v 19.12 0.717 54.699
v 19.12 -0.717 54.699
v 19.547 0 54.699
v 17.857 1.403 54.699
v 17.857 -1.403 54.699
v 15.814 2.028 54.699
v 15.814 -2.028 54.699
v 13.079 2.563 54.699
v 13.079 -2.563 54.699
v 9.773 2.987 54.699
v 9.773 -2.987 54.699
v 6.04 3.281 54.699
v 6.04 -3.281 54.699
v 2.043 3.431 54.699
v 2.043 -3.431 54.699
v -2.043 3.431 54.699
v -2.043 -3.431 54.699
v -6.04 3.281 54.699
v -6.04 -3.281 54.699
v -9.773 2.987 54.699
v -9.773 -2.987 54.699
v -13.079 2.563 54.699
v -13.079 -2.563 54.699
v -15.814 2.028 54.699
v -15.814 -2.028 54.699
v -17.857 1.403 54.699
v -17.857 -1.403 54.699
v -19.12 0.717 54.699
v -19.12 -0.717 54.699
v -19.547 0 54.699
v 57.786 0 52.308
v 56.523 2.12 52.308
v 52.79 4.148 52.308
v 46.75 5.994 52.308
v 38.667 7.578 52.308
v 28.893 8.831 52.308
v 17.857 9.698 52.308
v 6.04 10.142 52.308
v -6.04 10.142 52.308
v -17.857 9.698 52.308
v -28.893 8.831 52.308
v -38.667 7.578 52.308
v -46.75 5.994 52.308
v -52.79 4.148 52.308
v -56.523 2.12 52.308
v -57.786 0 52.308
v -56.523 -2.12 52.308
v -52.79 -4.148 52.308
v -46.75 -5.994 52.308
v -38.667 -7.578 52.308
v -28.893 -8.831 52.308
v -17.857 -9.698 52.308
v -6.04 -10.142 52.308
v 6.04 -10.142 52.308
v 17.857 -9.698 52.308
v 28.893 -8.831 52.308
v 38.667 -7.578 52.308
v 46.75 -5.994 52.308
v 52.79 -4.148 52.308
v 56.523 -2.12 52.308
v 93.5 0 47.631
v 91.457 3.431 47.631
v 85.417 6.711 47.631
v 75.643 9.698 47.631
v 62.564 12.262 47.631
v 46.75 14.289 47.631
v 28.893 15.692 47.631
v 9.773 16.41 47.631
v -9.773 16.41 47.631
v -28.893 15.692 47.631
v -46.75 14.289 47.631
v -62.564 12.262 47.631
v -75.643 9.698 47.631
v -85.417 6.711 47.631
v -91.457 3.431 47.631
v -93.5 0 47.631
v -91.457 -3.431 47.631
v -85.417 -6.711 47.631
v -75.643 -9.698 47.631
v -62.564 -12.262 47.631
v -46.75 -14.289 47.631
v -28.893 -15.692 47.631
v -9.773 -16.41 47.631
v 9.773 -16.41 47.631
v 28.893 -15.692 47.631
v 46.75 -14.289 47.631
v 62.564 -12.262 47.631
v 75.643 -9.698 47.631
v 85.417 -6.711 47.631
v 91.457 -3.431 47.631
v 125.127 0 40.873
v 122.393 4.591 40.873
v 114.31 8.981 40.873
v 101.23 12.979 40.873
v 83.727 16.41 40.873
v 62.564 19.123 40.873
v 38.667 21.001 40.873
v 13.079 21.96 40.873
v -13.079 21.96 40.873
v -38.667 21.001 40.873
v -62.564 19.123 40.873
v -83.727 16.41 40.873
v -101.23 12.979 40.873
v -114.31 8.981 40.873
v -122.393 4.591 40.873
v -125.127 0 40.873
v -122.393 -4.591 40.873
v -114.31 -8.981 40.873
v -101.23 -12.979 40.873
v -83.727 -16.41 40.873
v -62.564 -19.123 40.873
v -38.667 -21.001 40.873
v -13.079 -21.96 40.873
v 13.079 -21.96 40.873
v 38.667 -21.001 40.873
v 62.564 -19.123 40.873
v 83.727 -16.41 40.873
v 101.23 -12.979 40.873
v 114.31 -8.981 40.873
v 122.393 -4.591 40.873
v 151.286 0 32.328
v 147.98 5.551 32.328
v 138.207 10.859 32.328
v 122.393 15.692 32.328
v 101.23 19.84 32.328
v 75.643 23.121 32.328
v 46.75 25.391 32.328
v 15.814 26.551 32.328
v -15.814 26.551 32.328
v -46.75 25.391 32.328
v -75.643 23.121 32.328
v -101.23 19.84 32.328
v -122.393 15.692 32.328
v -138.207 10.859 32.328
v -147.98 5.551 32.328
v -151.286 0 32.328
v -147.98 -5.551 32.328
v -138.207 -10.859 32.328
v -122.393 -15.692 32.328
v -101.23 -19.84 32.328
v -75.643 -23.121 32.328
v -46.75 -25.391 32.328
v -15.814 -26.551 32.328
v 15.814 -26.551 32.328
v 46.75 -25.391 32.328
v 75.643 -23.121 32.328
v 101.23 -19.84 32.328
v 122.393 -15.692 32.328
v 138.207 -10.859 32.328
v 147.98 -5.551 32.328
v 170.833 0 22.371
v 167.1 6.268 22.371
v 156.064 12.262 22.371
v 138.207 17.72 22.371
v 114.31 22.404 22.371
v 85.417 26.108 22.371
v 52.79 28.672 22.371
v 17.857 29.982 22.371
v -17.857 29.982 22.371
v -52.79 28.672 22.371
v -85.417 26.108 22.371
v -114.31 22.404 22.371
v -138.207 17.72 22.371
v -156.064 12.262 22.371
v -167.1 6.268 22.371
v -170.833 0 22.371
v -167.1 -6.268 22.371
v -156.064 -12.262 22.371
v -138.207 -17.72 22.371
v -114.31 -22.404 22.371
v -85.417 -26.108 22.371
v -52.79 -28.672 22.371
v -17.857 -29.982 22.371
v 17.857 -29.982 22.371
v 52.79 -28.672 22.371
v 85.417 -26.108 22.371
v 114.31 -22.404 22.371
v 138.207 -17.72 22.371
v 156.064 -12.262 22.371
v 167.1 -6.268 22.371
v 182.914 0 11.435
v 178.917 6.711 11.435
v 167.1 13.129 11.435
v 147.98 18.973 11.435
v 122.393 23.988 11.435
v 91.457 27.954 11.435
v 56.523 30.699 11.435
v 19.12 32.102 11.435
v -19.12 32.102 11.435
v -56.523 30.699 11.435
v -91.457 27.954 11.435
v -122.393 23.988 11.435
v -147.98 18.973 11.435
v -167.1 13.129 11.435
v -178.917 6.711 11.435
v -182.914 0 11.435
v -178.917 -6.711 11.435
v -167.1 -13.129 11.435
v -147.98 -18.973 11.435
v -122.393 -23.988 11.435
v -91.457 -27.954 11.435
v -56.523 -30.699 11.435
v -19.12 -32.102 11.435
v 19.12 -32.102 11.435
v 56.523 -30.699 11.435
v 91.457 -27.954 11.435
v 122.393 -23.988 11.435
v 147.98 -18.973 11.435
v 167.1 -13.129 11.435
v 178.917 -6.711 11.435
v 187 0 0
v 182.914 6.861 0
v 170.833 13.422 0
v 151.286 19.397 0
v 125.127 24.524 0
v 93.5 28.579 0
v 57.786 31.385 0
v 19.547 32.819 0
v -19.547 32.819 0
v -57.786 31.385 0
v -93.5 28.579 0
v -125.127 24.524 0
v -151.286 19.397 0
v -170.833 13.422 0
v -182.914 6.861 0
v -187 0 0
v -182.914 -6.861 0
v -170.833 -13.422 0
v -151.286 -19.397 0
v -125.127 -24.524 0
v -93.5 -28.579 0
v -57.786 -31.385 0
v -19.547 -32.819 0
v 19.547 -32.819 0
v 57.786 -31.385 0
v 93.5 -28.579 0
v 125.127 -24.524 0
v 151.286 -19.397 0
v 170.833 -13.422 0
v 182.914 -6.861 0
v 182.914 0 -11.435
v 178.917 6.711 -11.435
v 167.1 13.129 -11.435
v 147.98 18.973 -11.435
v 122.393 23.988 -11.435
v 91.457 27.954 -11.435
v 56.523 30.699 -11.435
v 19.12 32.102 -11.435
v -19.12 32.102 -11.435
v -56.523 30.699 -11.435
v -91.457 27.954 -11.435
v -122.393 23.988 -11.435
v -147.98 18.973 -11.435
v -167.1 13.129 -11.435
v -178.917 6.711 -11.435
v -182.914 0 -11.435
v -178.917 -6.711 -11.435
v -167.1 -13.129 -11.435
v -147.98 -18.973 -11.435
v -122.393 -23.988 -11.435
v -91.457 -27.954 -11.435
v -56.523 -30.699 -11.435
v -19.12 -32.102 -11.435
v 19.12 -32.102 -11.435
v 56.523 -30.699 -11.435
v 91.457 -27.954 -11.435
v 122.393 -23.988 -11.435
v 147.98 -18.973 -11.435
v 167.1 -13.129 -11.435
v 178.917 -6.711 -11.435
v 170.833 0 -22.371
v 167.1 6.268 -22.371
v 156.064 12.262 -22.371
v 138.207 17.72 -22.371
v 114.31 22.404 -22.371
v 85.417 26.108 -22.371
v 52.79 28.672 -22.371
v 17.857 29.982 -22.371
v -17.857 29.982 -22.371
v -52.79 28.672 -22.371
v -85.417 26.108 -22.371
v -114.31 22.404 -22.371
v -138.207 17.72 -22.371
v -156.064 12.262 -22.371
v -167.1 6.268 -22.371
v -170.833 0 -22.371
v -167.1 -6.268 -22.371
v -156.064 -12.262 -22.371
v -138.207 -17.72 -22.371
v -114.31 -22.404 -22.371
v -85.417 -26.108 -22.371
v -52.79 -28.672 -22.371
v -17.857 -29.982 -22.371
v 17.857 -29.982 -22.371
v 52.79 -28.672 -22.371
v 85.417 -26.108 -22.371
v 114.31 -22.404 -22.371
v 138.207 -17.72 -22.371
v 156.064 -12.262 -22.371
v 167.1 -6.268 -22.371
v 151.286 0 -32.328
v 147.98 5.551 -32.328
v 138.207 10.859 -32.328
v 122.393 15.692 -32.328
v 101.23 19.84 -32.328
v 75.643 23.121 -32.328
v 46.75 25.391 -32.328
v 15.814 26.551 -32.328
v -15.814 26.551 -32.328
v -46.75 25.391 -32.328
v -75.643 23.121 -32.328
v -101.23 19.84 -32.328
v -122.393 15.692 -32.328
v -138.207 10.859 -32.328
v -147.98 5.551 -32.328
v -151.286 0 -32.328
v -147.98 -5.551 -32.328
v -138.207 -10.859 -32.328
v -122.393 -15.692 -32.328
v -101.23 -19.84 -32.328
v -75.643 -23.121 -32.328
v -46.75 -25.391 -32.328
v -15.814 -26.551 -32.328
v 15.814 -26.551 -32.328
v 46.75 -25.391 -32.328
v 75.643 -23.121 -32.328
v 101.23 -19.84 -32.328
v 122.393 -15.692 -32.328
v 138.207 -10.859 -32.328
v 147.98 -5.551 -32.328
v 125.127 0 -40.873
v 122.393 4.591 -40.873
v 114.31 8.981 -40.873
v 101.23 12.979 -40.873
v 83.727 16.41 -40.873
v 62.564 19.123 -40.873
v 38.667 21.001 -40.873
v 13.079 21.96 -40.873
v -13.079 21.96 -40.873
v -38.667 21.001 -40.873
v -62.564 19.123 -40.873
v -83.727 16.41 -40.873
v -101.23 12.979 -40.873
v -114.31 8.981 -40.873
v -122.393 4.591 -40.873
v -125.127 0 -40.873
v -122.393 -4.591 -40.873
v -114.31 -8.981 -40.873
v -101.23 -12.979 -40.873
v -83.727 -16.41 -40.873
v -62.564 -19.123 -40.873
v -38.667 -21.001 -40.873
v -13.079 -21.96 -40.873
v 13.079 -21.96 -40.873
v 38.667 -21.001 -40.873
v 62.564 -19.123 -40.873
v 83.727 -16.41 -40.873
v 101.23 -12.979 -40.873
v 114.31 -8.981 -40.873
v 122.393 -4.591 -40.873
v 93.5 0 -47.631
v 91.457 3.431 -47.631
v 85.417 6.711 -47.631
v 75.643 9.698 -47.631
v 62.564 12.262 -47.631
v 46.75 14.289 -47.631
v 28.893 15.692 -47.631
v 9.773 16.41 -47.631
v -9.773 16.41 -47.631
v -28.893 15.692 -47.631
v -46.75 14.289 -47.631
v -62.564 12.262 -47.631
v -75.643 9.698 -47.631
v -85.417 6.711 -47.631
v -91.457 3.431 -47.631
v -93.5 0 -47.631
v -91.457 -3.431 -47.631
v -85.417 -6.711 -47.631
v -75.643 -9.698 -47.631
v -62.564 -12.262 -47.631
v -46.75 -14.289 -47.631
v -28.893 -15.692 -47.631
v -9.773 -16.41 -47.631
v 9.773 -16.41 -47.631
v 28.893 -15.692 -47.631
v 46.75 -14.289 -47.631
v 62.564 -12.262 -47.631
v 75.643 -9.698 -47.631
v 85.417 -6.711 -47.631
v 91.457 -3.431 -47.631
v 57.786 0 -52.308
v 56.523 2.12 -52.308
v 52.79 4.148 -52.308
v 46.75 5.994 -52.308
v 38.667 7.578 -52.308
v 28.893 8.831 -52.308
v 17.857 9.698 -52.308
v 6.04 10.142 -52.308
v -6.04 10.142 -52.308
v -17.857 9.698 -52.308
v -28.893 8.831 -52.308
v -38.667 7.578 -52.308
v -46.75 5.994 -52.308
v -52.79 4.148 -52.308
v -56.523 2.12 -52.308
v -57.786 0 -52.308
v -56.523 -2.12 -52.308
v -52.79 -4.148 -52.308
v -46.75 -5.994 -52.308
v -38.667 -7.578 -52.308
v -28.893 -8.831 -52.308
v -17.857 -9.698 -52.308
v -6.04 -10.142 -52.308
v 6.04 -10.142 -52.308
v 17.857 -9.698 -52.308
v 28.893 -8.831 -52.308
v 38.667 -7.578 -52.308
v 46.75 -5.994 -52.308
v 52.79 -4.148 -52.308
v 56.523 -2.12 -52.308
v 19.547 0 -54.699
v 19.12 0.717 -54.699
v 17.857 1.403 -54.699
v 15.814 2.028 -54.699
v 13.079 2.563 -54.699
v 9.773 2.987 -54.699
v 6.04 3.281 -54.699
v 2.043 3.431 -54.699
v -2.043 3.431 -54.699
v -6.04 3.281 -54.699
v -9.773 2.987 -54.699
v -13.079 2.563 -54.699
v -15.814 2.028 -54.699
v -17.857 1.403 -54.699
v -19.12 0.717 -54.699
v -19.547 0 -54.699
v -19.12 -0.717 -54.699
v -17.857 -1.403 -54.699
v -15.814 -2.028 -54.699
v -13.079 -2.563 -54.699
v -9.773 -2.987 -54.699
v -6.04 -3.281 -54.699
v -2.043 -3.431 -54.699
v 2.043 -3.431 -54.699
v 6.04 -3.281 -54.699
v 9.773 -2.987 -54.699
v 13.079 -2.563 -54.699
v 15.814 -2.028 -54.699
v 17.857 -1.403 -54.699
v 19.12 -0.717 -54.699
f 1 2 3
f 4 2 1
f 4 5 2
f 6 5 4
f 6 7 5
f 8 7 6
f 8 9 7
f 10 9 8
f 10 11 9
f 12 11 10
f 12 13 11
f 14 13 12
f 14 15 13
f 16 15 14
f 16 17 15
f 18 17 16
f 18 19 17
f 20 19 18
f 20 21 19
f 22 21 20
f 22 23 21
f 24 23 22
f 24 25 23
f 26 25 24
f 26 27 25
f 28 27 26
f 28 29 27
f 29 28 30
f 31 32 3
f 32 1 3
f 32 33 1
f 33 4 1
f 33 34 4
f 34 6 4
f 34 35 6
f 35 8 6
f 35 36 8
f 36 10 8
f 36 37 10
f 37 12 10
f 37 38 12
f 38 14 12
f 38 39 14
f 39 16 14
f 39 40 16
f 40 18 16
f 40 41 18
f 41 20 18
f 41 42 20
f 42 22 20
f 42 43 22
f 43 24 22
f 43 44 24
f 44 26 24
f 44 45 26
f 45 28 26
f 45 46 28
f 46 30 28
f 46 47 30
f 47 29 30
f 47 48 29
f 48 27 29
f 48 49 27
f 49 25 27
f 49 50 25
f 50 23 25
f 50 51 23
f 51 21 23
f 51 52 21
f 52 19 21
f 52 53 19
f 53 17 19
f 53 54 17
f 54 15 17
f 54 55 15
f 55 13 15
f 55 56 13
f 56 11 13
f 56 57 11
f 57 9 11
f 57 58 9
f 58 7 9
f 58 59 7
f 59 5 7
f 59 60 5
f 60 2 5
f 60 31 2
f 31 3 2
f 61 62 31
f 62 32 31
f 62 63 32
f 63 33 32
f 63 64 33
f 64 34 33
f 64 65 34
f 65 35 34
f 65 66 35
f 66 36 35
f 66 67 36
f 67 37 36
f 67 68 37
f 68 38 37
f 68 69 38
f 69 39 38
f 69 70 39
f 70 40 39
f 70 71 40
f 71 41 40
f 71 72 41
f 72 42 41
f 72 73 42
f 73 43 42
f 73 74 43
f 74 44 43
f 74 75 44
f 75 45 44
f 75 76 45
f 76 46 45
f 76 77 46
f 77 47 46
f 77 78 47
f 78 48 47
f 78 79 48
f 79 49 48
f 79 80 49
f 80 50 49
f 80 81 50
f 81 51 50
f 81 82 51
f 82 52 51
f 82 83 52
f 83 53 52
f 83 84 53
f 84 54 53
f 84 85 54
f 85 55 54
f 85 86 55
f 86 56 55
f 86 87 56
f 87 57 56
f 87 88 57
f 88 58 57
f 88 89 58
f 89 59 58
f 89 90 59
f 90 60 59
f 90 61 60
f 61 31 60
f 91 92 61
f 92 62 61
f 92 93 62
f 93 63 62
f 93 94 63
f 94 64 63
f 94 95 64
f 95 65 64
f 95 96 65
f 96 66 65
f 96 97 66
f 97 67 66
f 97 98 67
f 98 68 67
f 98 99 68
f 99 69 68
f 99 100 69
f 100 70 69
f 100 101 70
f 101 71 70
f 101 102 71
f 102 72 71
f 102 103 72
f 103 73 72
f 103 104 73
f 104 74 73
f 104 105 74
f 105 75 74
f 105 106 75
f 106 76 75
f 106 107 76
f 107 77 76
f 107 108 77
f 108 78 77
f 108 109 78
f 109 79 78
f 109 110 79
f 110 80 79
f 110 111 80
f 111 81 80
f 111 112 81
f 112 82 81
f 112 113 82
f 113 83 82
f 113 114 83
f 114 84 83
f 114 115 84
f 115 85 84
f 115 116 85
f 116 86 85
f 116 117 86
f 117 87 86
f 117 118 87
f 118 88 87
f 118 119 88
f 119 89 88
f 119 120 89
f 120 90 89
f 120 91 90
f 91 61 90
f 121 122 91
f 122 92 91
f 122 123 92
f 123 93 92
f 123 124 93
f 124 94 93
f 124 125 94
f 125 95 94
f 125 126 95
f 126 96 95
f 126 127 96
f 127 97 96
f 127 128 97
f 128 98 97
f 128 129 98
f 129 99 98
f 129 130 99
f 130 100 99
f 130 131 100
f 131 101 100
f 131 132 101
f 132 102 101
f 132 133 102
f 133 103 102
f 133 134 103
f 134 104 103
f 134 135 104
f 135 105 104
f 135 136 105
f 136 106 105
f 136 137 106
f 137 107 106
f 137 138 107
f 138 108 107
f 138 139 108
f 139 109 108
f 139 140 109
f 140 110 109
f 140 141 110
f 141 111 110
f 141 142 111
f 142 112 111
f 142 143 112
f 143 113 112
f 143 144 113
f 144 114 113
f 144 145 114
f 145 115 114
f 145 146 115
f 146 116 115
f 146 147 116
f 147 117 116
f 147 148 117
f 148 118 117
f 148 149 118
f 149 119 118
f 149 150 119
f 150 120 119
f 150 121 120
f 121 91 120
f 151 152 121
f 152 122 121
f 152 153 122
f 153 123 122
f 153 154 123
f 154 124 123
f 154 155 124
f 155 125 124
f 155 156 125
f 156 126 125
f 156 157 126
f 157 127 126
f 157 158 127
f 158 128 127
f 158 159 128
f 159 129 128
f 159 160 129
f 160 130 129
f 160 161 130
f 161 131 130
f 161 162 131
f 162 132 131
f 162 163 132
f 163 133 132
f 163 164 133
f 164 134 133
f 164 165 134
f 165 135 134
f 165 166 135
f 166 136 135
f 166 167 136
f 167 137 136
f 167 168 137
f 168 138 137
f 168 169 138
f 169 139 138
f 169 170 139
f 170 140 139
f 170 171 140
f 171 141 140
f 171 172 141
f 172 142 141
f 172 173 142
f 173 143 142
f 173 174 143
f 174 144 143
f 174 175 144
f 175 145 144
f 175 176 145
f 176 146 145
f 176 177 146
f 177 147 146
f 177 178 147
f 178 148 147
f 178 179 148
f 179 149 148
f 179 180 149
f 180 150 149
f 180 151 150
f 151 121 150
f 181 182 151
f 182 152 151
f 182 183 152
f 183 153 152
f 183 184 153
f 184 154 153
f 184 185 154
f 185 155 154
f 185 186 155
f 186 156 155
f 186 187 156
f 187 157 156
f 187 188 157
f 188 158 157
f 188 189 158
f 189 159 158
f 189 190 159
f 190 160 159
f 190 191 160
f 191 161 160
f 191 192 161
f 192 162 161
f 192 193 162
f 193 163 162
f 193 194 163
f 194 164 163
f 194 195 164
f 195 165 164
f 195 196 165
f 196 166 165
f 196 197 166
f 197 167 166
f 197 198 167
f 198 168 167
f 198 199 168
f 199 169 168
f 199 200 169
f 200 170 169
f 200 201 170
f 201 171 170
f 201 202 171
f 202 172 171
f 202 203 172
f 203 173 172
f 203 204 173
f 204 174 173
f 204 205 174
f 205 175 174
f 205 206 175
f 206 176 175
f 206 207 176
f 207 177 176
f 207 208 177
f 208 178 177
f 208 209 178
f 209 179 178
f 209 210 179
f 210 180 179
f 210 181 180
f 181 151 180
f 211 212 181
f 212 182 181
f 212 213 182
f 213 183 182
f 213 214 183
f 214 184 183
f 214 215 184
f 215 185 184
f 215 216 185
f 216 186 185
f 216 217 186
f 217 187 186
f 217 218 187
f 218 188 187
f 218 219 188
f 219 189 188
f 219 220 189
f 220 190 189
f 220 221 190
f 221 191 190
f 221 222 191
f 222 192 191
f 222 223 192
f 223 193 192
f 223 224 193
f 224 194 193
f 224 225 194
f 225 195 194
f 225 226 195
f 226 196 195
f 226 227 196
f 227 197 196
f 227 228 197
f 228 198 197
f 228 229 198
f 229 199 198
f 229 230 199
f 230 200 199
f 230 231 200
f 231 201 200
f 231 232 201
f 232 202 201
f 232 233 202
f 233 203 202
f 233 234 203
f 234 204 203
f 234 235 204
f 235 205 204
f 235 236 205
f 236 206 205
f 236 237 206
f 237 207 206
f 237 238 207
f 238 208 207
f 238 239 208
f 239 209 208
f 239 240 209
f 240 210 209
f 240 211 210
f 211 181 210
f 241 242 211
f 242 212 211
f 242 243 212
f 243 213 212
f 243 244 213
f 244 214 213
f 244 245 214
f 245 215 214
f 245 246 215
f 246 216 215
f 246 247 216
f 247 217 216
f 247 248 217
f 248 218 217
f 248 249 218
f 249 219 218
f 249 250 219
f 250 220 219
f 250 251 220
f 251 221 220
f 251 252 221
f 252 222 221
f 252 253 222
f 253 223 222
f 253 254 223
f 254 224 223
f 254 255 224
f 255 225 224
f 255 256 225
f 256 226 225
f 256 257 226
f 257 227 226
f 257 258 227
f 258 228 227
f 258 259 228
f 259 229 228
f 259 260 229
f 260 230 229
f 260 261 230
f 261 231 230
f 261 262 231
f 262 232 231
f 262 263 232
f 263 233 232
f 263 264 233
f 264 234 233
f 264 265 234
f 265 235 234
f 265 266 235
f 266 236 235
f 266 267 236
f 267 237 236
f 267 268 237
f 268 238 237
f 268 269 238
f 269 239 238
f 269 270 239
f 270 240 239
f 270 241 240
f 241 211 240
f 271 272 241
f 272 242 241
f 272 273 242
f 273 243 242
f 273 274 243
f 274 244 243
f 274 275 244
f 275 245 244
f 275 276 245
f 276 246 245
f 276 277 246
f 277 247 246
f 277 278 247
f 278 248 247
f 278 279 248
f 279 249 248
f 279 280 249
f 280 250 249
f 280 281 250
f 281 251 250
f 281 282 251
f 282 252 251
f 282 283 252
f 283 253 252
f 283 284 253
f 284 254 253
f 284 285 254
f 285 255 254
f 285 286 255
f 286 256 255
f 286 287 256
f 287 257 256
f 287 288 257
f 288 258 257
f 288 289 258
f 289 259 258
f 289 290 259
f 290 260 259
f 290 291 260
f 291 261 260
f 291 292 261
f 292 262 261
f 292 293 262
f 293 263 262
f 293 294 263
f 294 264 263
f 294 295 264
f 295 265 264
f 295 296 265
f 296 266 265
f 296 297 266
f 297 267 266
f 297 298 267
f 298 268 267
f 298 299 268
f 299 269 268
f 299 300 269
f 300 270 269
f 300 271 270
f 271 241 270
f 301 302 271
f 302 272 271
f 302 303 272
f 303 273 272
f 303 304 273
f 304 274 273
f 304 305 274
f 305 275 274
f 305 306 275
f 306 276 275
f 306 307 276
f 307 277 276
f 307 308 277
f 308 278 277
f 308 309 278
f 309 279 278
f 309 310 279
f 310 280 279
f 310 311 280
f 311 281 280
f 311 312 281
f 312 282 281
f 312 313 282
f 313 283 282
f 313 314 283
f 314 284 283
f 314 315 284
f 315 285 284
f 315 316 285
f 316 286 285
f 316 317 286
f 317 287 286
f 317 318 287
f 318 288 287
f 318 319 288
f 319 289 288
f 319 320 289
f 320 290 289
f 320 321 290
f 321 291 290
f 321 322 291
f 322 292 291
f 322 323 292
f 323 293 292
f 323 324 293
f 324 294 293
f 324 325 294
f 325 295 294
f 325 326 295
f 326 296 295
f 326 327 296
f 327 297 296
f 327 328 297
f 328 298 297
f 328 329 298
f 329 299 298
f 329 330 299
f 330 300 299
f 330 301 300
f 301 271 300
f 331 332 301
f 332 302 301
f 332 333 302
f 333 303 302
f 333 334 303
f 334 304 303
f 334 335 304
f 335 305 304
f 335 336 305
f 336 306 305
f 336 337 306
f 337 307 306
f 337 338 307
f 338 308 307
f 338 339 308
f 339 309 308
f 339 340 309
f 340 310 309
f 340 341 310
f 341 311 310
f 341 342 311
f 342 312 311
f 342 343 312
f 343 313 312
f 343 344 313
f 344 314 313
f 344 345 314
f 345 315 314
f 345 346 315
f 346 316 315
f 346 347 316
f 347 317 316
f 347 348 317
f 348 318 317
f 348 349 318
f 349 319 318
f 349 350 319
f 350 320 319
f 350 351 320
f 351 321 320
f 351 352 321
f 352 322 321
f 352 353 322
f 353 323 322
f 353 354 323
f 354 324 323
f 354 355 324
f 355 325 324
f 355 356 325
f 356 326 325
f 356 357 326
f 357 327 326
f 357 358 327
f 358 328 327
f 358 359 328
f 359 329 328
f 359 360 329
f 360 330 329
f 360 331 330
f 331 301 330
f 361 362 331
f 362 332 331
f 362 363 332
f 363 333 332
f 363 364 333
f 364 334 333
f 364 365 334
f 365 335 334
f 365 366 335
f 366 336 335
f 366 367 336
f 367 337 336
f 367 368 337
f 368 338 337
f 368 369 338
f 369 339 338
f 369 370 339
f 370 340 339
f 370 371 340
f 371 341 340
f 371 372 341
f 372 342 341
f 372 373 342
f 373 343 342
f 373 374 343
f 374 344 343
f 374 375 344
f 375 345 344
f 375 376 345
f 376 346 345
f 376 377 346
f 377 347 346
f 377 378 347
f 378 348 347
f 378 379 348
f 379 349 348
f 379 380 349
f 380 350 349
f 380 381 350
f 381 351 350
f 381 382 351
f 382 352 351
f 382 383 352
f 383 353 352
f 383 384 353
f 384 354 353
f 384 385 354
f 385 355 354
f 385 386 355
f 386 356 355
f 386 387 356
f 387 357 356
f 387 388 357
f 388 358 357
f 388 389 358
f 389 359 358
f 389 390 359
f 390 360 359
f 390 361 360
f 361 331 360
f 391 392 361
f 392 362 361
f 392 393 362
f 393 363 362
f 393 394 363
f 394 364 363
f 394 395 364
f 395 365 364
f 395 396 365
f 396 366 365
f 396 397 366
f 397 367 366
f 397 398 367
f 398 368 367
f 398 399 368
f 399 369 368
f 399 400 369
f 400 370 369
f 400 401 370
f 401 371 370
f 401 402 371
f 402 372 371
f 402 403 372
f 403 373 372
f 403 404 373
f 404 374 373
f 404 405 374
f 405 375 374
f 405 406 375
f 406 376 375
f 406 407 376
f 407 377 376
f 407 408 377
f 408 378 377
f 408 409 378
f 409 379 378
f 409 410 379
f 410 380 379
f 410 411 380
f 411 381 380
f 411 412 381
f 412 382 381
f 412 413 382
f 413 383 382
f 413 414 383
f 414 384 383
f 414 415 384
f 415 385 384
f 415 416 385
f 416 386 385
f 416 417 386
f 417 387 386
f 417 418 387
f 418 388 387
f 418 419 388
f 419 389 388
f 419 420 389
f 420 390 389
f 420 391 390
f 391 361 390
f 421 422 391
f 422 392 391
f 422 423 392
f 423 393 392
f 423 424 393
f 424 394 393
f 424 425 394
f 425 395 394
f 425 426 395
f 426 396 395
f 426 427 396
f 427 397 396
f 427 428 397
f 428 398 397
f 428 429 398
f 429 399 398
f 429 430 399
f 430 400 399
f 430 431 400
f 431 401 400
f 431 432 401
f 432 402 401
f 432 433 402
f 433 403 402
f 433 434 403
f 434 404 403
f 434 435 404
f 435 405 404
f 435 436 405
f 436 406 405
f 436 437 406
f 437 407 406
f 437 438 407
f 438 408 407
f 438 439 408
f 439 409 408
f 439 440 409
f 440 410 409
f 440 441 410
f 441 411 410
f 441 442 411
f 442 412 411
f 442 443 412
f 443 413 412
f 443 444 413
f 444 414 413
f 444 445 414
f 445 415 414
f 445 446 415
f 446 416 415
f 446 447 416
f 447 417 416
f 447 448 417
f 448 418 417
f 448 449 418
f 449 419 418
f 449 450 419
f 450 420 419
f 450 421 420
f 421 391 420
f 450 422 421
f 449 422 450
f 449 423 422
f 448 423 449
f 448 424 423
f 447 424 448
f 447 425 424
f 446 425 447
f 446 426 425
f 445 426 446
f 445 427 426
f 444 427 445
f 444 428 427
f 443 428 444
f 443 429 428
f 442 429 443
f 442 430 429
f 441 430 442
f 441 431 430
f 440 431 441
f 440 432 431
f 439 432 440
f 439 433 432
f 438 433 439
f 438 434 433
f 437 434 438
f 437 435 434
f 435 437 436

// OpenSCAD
// Generated by SolidPython 1.0.1 on 2020-07-29 00:46:52


scale(v = [17, 3, 5]) {
	sphere(r = 11);
}
/***********************************************
*********      SolidPython code:      **********
************************************************
 
# import packages: SolidPython
from solid import *
from solid.utils import *
from itertools import chain, combinations, permutations


class Resize:

    def __init__(self, scad_file):
        self.scad_file = scad_file
        #self.scad_file = import_scad(scad_file)
        # cone/cylinder param:
        self.r1 = 0
        self.r2 = 0
        self.h = 0
        # rectangular prism param:
        self.w = 0
        self.l = 0
        # ellipse param:
        self.r = 0

    # import OpenScad code (file name corresponds to shape)


    # classify shape + parameters
    def assign(self, param1, param2, param3):
        if self.scad_file == 'cone.scad':
            self.r1 = param1
            self.r2 = param2
            self.h = param3
        elif self.scad_file == 'cylinder.scad':
            self.r1 = param1
            self.r2 = param2
            self.h = param3
        elif self.scad_file == 'rectangularPrism.scad':
            self.h = param1
            self.l = param2
            self.w = param3
        else:
            self.r = param1
            self.h = param2

    # resize parameters
    def iterate(self):
        x = range(3, 20, 2)
        i = 1
        if self.scad_file == 'cone.scad':
            tempList = list(permutations(x, 2))
            for temp in tempList:
                param1 = temp[0]
                param2 = temp[1]
                filepath = 'produced_scad_files/' + 'cone' + str(param1) + '_' + str(param2) + '_' + '.scad'
                scad_render_to_file(cylinder(h=param1, r1=param2, r2=0), filepath)

        elif self.scad_file == 'cylinder.scad':
            tempList = list(permutations(x, 3))
            for temp in tempList:
                param1 = temp[0]
                param2 = temp[1]
                filepath = 'produced_scad_files/' + 'cylinder' + str(param1) + '_' + str(param2) + '_' + '.scad'
                scad_render_to_file(cylinder(h=param1, r1=param2, r2=param2), filepath)

        elif self.scad_file == 'rectangularPrism.scad':
            tempList = list(permutations(x, 3))
            for temp in tempList:
                param1 = temp[0]
                param2 = temp[1]
                param3 = temp[2]
                filepath = 'produced_scad_files/' + 'rectangularPrism' + str(param1) + '_' + str(param2) + '_' + str(
                    param3) + '.scad'
                scad_render_to_file(cube(size=(param1, param2, param3)), filepath)

        elif self.scad_file == 'ellipse.scad':
            tempList = list(permutations(x, 4))
            for temp in tempList:
                param1 = temp[0]
                param2 = temp[1]
                param3 = temp[2]
                param4 = temp[3]
                filepath = 'produced_scad_files/' + 'ellipse' + str(param1) + '_' + str(param2) + '_' + str(param3) + '_' + str(param4) + '.scad'
                scad_render_to_file(scale([param1, param2, param3])(sphere(r=param4)), filepath)

    def render_to_scadfile(self):
        scad_render_to_file(scad, 'example.scad') 
 
************************************************/
